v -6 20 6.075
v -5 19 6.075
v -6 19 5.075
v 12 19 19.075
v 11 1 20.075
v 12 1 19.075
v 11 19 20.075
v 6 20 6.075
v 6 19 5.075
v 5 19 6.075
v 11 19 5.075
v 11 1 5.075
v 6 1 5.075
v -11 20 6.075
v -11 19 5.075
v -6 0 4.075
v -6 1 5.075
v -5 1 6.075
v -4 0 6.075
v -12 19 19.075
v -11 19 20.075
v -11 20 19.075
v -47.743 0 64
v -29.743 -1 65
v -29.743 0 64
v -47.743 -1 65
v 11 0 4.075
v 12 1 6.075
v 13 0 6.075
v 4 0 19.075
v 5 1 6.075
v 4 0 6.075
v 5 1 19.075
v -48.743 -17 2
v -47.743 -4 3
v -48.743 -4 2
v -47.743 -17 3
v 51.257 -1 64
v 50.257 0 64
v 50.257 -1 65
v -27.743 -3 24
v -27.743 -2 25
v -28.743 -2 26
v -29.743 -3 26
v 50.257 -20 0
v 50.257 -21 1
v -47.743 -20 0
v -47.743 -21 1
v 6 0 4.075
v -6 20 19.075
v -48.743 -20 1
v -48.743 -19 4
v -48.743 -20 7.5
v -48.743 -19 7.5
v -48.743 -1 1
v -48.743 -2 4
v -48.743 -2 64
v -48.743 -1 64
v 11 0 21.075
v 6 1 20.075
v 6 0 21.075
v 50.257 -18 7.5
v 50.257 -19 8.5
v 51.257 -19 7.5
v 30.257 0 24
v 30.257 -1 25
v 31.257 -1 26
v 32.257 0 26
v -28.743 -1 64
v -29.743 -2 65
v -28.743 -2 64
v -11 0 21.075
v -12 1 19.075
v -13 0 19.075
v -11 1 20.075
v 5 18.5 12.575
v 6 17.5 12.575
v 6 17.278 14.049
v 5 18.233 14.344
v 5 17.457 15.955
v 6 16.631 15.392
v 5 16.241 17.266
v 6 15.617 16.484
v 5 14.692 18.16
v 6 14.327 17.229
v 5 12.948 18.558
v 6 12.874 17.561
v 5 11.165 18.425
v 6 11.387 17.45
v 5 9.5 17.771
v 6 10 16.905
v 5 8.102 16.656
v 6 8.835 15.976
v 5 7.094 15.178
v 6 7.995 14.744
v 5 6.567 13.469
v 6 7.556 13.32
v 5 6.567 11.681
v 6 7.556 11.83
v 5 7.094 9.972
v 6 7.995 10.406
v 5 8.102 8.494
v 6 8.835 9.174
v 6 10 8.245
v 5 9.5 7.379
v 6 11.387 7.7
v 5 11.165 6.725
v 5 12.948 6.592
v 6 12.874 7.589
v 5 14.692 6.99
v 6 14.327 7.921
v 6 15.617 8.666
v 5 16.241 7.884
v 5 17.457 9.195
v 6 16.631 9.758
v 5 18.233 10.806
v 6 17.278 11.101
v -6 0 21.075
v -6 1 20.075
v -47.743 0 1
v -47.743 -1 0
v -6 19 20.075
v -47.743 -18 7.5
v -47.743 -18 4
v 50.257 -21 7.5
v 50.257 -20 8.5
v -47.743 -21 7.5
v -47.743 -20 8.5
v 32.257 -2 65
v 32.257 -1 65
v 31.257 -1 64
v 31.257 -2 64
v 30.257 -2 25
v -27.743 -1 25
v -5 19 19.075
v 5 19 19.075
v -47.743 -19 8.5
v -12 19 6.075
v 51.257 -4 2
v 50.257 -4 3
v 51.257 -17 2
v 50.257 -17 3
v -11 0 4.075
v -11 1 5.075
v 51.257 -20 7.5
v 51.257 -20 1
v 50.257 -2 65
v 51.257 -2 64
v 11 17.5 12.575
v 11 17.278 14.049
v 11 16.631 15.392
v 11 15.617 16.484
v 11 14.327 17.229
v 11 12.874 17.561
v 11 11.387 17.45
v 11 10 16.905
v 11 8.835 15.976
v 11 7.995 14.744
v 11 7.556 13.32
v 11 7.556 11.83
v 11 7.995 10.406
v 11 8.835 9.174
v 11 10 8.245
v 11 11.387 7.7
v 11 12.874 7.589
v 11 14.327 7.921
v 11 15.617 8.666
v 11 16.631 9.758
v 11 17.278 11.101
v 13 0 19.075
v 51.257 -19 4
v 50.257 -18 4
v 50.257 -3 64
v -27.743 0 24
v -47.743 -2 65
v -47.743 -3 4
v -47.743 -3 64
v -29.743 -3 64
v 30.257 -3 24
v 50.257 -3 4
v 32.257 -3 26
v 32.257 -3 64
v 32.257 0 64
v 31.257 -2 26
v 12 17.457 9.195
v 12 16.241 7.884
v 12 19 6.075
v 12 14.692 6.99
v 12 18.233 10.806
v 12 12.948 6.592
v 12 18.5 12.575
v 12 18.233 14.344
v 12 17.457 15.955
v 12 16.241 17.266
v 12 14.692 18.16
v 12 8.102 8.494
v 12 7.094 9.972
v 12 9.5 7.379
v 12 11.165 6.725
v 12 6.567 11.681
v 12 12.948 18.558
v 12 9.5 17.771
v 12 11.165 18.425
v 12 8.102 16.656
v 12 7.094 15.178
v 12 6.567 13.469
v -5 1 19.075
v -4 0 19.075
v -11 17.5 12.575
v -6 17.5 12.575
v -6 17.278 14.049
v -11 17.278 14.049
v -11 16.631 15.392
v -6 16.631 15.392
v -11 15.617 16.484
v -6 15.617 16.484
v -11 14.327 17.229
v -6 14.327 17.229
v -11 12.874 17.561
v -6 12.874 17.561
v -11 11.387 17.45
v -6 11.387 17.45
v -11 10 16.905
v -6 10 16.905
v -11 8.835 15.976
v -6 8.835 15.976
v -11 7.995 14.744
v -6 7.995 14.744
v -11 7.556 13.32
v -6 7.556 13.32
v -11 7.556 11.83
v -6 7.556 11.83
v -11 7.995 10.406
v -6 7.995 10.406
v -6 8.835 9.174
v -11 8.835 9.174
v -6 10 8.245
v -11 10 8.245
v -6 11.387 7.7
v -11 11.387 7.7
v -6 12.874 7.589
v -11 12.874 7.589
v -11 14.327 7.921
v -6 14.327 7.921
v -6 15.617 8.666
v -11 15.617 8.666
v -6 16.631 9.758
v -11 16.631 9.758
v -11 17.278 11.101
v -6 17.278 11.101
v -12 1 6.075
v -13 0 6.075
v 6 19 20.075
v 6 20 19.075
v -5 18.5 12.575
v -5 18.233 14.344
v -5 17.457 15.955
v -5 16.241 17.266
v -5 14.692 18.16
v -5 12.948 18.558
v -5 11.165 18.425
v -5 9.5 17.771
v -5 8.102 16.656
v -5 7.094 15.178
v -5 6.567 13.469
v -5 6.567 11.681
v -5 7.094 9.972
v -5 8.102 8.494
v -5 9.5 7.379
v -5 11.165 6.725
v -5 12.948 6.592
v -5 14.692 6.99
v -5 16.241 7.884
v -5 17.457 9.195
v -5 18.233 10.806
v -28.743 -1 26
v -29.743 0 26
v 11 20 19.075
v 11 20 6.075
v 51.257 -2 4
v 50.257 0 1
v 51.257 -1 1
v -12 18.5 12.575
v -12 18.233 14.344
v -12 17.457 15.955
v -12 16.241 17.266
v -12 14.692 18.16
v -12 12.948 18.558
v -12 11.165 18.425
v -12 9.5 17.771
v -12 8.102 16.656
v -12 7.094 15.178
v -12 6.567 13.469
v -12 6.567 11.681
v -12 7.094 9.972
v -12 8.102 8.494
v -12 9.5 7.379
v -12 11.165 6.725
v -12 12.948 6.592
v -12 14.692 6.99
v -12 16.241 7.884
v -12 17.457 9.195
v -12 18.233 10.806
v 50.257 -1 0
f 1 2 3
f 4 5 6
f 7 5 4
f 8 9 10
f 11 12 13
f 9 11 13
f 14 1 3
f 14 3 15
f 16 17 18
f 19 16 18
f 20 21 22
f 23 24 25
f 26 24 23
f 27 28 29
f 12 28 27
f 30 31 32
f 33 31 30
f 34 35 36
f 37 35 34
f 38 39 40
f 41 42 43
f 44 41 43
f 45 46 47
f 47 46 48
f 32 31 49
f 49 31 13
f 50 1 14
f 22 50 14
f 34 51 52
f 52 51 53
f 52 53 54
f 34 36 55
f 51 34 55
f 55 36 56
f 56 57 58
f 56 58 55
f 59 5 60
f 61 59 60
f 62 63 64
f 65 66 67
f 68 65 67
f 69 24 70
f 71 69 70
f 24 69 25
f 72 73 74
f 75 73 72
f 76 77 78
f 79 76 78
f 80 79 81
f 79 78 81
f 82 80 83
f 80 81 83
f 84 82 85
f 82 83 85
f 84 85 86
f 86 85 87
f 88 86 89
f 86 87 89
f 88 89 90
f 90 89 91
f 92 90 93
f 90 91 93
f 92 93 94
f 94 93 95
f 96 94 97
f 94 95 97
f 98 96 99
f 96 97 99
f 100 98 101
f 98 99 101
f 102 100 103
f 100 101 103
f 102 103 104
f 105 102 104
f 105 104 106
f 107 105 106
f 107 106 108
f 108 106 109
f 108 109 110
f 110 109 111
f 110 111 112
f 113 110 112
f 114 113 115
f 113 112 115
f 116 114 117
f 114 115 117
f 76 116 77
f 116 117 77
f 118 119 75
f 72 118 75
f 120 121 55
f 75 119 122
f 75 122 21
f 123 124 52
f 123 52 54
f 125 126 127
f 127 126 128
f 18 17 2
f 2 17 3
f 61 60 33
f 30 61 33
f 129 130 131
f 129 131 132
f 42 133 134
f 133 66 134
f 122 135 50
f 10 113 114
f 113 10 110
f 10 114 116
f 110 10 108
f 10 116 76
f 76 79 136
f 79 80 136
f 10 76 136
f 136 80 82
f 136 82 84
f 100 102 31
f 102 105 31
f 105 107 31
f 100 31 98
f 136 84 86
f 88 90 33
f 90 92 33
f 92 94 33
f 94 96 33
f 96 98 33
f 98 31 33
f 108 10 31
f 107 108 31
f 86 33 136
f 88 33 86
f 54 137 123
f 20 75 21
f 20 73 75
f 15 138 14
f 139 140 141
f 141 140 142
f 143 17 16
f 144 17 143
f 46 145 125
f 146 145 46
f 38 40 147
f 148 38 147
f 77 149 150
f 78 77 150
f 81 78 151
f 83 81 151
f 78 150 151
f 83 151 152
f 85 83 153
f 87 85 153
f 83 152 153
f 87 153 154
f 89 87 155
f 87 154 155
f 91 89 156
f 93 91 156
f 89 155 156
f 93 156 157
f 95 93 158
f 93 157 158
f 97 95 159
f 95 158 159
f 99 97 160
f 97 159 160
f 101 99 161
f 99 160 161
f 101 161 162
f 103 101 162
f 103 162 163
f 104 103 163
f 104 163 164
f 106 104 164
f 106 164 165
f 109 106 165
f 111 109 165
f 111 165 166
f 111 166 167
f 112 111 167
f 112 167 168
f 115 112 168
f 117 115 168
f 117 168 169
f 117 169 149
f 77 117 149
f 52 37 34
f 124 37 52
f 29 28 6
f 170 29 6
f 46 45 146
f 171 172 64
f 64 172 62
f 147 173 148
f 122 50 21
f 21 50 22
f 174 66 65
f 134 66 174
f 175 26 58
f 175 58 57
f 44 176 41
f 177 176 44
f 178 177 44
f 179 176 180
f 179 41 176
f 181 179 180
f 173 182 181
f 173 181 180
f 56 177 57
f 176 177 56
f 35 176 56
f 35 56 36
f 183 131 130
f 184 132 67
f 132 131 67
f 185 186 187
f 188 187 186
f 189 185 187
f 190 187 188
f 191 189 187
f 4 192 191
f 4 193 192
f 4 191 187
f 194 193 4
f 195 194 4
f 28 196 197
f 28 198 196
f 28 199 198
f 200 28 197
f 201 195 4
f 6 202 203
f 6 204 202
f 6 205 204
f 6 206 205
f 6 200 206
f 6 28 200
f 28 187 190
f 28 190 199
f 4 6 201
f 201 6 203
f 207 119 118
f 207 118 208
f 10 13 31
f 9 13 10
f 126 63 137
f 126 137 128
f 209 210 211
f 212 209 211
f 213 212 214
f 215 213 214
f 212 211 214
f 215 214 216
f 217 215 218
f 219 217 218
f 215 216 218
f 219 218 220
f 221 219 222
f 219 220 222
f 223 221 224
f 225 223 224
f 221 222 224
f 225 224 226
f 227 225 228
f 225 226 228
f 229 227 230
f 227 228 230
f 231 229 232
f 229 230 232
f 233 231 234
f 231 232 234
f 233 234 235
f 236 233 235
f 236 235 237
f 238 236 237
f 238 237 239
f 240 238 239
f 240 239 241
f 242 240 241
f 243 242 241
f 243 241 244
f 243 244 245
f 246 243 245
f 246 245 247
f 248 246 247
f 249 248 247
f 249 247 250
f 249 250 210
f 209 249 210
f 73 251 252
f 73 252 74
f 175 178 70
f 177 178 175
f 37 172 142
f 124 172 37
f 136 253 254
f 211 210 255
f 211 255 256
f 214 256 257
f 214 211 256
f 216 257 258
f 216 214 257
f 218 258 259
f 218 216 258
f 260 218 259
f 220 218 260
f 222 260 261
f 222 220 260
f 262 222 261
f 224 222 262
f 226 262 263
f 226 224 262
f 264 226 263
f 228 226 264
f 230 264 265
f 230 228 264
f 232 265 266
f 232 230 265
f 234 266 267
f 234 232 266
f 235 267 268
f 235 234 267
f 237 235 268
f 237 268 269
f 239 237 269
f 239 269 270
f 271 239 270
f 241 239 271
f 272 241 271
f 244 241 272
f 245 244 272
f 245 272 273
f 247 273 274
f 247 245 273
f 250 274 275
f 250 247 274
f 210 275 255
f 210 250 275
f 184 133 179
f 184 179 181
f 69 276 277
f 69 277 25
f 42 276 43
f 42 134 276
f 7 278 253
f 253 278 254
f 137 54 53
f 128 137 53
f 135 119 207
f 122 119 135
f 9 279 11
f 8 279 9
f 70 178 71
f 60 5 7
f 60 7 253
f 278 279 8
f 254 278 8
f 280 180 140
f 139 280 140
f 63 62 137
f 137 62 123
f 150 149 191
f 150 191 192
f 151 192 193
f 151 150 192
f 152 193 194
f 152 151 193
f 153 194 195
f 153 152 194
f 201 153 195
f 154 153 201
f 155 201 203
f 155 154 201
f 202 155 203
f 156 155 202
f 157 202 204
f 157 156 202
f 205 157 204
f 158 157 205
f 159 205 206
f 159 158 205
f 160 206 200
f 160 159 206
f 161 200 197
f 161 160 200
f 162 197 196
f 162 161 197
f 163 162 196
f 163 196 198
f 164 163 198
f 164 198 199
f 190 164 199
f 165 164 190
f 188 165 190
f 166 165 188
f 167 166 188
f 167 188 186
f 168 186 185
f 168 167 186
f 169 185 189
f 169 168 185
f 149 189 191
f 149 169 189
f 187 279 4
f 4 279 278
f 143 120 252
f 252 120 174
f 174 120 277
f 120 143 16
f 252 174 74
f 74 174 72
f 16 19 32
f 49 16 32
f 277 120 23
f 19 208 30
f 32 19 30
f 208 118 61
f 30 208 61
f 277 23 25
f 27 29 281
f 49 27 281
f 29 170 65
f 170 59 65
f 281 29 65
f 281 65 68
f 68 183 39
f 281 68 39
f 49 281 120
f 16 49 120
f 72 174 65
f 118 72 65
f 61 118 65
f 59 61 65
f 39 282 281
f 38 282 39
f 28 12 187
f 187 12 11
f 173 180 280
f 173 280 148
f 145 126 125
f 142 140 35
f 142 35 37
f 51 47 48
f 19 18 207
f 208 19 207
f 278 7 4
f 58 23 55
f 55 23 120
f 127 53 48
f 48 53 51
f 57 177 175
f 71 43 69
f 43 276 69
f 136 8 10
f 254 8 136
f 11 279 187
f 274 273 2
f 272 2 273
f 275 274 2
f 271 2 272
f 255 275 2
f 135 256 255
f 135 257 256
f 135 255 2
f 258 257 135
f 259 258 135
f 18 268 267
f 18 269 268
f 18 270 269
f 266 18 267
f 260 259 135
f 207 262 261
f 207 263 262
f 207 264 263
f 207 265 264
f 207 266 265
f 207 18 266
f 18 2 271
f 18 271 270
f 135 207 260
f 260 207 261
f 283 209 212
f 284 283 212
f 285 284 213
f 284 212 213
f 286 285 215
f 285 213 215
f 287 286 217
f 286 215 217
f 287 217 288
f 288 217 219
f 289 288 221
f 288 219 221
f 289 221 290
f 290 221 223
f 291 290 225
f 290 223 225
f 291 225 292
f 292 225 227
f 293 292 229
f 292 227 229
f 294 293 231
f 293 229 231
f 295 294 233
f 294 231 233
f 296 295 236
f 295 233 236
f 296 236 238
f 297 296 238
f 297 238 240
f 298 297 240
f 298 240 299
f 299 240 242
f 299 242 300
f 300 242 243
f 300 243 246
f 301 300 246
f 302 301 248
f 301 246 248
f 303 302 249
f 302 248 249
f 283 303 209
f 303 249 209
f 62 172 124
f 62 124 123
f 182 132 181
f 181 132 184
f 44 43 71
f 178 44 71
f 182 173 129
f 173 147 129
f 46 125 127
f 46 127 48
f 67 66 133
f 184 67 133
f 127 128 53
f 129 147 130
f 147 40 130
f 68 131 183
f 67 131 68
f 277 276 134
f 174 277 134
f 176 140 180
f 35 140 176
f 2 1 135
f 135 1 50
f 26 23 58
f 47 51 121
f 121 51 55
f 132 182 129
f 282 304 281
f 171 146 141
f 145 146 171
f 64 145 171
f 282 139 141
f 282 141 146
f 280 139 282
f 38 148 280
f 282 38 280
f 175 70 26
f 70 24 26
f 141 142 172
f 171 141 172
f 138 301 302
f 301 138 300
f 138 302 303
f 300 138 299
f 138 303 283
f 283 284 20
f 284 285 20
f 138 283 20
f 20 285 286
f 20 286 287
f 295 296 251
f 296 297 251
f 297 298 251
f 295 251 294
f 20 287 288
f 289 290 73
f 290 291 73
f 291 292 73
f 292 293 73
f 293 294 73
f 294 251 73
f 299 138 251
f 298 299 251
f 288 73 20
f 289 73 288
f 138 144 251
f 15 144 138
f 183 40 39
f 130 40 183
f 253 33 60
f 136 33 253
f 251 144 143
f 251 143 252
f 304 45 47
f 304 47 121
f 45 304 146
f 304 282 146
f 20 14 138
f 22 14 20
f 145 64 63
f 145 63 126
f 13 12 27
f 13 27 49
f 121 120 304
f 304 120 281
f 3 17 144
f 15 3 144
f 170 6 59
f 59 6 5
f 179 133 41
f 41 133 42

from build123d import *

# Parameters (mm, degrees)
F1_DEPTH = 3
F3_DEPTH = 100
F4_W     = 7
F4_H     = 15
F5_DEPTH = 20
F6_R     = 5
F7_DEPTH = 25
F8_SIZE  = 1


with BuildPart() as f1:
    # F0 (on Front) → F1 (new body)
    with BuildSketch(Plane.XZ):
        Polygon((-48.7427460821, 65), (-48.7427460821, 0), (51.2572539179, 0), (51.2572539179, 65), (31.2572539179, 65), (31.2572539179, 25), (-28.7427460821, 25), (-28.7427460821, 65), align=None)
    extrude(amount=F1_DEPTH)

    # F2 (on face) → F3 (join)
    with BuildSketch(Plane.YZ.offset(51.2572539179)):
        Polygon((-21, 0), (-3, 0), (-3, 2.9999055994), (-18, 2.9999055994), (-18, 8.5), (-21, 8.5), align=None)
    extrude(amount=-F3_DEPTH)

    # F4 (on face) → F5 (join)
    with BuildSketch(Plane(origin=(0, 0, 0), x_dir=(-1, 0, 0), z_dir=(0, 1, 0))):
        with Locations((-8.5, 12.5750002265)):
            Rectangle(F4_W, F4_H)
        with Locations((8.5, 12.5750002265)):
            Rectangle(F4_W, F4_H)
    extrude(amount=F5_DEPTH)

    # F6 (on face) → F7 (cut)
    with BuildSketch(Plane.YZ.offset(12)):
        with Locations((12.5, 12.5750002265)):
            Circle(F6_R)
    extrude(amount=-F7_DEPTH, mode=Mode.SUBTRACT)

    # F8
    f8_edges = [f1.edges().sort_by_distance(p)[0] for p in [
        (1.257254, -3, 2.999906),
        (1.257254, -18, 2.999906),
        (12, 0, 12.575),
        (8.5, 0, 20.075),
        (5, 0, 12.575),
        (8.5, 0, 5.075),
        (-8.5, 0, 5.075),
        (-12, 0, 12.575),
        (-8.5, 0, 20.075),
        (-5, 0, 12.575),
        (12, 7.5, 12.575),
        (5, 7.5, 12.575),
        (-12, 7.5, 12.575),
        (-5, 7.5, 12.575),
        (51.257254, -10.5, 0),
        (1.257254, -21, 0),
        (1.257254, 0, 0),
        (-48.742746, -10.5, 0),
        (1.257254, -21, 8.5),
        (1.257254, -18, 8.5),
        (-48.742746, -19.5, 8.5),
        (51.257254, -19.5, 8.5),
        (1.257254, -3, 25),
        (31.257254, -3, 45),
        (41.257254, -3, 65),
        (51.257254, -3, 33.999953),
        (-48.742746, -3, 33.999953),
        (-48.742746, 0, 32.5),
        (-28.742746, -3, 45),
        (-38.742746, -3, 65),
        (-28.742746, 0, 45),
        (1.257254, 0, 25),
        (31.257254, 0, 45),
        (31.257254, -1.5, 65),
        (31.257254, -1.5, 25),
        (-28.742746, -1.5, 65),
        (51.257254, 0, 32.5),
        (41.257254, 0, 65),
        (-48.742746, -10.5, 2.999906),
        (-38.742746, 0, 65),
        (12, 10, 20.075),
        (5, 10, 20.075),
        (5, 10, 5.075),
        (-5, 10, 20.075),
        (-12, 10, 20.075),
        (-12, 10, 5.075),
        (8.5, 20, 20.075),
        (8.5, 20, 5.075),
        (-5, 20, 12.575),
        (-8.5, 20, 20.075),
        (-12, 20, 12.575),
        (51.257254, -1.5, 65),
        (-28.742746, -1.5, 25),
        (-48.742746, -1.5, 65),
        (-48.742746, -18, 5.749953),
        (51.257254, -10.5, 2.999906),
        (51.257254, -21, 4.25),
        (-48.742746, -21, 4.25),
        (51.257254, -18, 5.749953),
        (12, 20, 12.575),
        (5, 20, 12.575),
        (12, 10, 5.075),
        (-5, 10, 5.075),
        (-8.5, 20, 5.075),
    ]]
    chamfer(f8_edges, length=F8_SIZE)


solid = f1.part
